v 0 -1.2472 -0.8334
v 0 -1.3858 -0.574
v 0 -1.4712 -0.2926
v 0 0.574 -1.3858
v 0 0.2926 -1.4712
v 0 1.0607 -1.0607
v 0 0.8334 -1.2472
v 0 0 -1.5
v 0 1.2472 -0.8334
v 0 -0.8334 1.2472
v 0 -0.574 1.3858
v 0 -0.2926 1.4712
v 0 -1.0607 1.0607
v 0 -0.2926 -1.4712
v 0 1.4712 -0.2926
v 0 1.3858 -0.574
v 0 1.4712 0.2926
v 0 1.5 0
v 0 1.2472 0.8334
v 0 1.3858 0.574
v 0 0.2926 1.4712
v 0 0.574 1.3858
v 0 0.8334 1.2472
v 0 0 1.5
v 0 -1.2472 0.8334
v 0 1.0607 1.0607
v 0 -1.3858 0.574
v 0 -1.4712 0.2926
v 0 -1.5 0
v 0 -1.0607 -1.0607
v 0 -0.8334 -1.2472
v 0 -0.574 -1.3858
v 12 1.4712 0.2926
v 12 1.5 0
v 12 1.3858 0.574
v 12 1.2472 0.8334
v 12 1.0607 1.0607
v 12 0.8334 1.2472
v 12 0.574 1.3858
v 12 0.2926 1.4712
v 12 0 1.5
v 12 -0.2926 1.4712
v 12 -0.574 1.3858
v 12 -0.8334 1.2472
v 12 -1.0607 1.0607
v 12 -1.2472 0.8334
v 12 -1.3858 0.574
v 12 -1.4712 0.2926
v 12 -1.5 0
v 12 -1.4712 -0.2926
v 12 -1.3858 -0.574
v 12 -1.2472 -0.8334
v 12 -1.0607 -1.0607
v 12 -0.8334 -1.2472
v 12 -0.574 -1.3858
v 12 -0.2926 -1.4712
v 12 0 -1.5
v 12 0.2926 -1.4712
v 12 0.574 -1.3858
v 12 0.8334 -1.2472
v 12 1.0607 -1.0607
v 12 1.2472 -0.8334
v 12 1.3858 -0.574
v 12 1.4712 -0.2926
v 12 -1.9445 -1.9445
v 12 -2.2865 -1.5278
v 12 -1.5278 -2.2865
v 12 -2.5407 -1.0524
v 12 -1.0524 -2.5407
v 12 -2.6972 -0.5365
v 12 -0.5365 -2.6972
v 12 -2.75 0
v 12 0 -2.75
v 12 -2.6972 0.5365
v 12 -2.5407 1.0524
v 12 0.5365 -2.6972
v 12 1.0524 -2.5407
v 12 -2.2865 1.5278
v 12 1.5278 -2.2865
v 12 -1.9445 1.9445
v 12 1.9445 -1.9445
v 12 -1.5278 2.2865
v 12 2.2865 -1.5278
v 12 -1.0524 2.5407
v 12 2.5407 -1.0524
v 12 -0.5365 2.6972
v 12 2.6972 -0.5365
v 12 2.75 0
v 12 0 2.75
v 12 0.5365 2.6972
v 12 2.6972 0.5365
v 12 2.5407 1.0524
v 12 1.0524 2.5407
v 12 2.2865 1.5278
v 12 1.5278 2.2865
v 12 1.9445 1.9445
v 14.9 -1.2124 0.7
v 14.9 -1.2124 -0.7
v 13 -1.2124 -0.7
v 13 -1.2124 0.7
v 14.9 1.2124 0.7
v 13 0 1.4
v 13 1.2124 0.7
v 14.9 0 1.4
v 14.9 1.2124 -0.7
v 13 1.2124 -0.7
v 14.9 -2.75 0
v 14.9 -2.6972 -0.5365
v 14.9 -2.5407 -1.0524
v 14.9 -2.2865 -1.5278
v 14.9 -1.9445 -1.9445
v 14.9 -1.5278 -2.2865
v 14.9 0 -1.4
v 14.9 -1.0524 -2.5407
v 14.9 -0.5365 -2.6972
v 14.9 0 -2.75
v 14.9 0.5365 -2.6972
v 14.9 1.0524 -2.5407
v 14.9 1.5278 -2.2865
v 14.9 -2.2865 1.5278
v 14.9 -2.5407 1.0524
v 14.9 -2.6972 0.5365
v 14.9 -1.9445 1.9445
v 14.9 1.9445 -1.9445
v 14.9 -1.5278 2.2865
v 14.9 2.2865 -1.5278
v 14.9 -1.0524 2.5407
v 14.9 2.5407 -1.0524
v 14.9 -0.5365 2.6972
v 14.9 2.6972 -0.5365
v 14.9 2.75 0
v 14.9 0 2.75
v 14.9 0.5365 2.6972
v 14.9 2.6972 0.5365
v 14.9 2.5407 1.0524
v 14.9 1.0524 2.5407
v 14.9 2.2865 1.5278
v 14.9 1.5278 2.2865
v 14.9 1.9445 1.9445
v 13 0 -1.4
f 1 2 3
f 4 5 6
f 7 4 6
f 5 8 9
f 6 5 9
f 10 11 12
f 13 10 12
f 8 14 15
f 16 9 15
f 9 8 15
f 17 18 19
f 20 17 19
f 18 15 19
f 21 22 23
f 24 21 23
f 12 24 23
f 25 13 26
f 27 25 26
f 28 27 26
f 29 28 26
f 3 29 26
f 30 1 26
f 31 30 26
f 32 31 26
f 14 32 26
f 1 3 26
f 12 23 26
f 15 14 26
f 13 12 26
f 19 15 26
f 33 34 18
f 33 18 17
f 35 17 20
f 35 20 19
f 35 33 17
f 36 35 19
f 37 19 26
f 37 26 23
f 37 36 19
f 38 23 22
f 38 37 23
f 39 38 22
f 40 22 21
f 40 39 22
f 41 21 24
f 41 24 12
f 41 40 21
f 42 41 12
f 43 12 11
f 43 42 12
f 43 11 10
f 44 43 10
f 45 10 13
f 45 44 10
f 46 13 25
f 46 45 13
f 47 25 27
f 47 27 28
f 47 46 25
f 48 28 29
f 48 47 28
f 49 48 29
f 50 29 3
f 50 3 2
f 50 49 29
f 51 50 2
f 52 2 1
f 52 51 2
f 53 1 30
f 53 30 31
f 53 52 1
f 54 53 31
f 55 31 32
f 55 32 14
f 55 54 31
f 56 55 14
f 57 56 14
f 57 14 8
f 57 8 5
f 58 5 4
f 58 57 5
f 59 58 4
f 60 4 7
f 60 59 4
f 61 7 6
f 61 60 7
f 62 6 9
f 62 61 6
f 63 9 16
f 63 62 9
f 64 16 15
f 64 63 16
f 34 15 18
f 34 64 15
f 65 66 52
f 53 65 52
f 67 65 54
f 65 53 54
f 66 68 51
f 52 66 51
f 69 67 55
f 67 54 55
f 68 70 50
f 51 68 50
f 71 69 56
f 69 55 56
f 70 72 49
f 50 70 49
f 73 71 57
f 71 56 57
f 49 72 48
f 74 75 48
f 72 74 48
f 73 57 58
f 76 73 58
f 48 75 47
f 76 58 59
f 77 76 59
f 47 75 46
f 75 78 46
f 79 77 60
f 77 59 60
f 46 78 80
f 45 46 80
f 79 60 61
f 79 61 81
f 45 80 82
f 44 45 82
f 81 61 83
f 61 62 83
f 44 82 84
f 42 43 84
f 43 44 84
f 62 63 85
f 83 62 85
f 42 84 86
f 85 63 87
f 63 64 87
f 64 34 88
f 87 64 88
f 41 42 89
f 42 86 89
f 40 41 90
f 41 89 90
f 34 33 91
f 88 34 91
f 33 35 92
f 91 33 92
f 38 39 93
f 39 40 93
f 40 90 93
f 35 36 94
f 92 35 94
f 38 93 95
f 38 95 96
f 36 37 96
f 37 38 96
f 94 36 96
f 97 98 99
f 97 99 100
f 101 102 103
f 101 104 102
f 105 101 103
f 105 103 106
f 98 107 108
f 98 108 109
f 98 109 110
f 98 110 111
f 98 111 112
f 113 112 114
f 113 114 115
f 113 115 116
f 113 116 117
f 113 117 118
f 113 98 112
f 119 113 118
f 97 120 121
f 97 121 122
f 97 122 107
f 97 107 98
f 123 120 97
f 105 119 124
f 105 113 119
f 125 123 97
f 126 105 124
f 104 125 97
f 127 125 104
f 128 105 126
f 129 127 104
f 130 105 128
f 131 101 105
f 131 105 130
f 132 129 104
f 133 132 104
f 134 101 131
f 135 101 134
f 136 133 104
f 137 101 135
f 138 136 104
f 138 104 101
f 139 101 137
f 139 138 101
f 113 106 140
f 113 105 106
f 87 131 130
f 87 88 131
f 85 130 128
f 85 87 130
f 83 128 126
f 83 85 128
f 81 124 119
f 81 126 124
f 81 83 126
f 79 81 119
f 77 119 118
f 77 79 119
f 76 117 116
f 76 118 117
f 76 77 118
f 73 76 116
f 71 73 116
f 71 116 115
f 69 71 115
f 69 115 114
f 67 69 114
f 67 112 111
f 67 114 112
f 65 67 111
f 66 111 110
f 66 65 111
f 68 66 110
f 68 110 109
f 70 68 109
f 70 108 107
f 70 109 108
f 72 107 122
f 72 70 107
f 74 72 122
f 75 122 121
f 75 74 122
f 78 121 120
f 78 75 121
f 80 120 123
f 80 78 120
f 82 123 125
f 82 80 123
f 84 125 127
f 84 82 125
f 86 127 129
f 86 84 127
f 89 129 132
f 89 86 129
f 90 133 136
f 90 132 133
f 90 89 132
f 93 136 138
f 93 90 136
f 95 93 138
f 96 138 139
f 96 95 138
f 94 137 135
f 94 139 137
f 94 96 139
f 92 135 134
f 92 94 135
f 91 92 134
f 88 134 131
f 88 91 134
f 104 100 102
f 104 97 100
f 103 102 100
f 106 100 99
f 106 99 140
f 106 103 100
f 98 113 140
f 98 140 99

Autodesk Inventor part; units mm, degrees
ref_plane "YZ Plane" through (0, 0, 0) normal (1, 0, 0) x (0, 1, 0)
ref_plane "XZ Plane" through (0, 0, 0) normal (0, 1, 0) x (-1, 0, 0)
ref_plane "XY Plane" through (0, 0, 0) normal (0, 0, 1) x (1, 0, 0)
sketch "Sketch1" plane through (0, 0, 0) normal (0, 0, 1) x (1, 0, 0)
  line L0 (0, 0) -> (14.9, 0)
  line L1 (14.9, 0) -> (14.9, 2.75)
  line L2 (14.9, 2.75) -> (12, 2.75)
  line L3 (0, 0) -> (0, 1.5)
  line L4 (0, 1.5) -> (12, 1.5)
  line L5 (12, 1.5) -> (12, 2.75)
  dimension "d0" = 14.9
  dimension "d1" = 2.75
  dimension "d2" = 2.9
  dimension "d3" = 1.5
revolve "Revolution1" add sketch "Sketch1" angle 360 about axis through (0, 0, 0) along (1, 0, 0)
sketch "Sketch2" plane through (14.9, 0, 0) normal (1, 0, 0) x (0, 0, -1)
  line L0 (0.7, 1.2124) -> (1.4, 0)
  line L1 (1.4, 0) -> (0.7, -1.2124)
  line L2 (0.7, -1.2124) -> (-0.7, -1.2124)
  line L3 (-0.7, -1.2124) -> (-1.4, 0)
  line L4 (-1.4, 0) -> (-0.7, 1.2124)
  line L5 (-0.7, 1.2124) -> (0.7, 1.2124)
  point P0 (0, 0)
  point P1 (0, 0)
  dimension "d6" = 2.8
extrude "Extrusion1" cut sketch "Sketch2" against normal blind 1.9
thread "Thread1" size "M3x0.5" class "6g" standard "ANSI Metric M Profile" full length
properties part number "fasten_bolt" material "Steel, Mild"
